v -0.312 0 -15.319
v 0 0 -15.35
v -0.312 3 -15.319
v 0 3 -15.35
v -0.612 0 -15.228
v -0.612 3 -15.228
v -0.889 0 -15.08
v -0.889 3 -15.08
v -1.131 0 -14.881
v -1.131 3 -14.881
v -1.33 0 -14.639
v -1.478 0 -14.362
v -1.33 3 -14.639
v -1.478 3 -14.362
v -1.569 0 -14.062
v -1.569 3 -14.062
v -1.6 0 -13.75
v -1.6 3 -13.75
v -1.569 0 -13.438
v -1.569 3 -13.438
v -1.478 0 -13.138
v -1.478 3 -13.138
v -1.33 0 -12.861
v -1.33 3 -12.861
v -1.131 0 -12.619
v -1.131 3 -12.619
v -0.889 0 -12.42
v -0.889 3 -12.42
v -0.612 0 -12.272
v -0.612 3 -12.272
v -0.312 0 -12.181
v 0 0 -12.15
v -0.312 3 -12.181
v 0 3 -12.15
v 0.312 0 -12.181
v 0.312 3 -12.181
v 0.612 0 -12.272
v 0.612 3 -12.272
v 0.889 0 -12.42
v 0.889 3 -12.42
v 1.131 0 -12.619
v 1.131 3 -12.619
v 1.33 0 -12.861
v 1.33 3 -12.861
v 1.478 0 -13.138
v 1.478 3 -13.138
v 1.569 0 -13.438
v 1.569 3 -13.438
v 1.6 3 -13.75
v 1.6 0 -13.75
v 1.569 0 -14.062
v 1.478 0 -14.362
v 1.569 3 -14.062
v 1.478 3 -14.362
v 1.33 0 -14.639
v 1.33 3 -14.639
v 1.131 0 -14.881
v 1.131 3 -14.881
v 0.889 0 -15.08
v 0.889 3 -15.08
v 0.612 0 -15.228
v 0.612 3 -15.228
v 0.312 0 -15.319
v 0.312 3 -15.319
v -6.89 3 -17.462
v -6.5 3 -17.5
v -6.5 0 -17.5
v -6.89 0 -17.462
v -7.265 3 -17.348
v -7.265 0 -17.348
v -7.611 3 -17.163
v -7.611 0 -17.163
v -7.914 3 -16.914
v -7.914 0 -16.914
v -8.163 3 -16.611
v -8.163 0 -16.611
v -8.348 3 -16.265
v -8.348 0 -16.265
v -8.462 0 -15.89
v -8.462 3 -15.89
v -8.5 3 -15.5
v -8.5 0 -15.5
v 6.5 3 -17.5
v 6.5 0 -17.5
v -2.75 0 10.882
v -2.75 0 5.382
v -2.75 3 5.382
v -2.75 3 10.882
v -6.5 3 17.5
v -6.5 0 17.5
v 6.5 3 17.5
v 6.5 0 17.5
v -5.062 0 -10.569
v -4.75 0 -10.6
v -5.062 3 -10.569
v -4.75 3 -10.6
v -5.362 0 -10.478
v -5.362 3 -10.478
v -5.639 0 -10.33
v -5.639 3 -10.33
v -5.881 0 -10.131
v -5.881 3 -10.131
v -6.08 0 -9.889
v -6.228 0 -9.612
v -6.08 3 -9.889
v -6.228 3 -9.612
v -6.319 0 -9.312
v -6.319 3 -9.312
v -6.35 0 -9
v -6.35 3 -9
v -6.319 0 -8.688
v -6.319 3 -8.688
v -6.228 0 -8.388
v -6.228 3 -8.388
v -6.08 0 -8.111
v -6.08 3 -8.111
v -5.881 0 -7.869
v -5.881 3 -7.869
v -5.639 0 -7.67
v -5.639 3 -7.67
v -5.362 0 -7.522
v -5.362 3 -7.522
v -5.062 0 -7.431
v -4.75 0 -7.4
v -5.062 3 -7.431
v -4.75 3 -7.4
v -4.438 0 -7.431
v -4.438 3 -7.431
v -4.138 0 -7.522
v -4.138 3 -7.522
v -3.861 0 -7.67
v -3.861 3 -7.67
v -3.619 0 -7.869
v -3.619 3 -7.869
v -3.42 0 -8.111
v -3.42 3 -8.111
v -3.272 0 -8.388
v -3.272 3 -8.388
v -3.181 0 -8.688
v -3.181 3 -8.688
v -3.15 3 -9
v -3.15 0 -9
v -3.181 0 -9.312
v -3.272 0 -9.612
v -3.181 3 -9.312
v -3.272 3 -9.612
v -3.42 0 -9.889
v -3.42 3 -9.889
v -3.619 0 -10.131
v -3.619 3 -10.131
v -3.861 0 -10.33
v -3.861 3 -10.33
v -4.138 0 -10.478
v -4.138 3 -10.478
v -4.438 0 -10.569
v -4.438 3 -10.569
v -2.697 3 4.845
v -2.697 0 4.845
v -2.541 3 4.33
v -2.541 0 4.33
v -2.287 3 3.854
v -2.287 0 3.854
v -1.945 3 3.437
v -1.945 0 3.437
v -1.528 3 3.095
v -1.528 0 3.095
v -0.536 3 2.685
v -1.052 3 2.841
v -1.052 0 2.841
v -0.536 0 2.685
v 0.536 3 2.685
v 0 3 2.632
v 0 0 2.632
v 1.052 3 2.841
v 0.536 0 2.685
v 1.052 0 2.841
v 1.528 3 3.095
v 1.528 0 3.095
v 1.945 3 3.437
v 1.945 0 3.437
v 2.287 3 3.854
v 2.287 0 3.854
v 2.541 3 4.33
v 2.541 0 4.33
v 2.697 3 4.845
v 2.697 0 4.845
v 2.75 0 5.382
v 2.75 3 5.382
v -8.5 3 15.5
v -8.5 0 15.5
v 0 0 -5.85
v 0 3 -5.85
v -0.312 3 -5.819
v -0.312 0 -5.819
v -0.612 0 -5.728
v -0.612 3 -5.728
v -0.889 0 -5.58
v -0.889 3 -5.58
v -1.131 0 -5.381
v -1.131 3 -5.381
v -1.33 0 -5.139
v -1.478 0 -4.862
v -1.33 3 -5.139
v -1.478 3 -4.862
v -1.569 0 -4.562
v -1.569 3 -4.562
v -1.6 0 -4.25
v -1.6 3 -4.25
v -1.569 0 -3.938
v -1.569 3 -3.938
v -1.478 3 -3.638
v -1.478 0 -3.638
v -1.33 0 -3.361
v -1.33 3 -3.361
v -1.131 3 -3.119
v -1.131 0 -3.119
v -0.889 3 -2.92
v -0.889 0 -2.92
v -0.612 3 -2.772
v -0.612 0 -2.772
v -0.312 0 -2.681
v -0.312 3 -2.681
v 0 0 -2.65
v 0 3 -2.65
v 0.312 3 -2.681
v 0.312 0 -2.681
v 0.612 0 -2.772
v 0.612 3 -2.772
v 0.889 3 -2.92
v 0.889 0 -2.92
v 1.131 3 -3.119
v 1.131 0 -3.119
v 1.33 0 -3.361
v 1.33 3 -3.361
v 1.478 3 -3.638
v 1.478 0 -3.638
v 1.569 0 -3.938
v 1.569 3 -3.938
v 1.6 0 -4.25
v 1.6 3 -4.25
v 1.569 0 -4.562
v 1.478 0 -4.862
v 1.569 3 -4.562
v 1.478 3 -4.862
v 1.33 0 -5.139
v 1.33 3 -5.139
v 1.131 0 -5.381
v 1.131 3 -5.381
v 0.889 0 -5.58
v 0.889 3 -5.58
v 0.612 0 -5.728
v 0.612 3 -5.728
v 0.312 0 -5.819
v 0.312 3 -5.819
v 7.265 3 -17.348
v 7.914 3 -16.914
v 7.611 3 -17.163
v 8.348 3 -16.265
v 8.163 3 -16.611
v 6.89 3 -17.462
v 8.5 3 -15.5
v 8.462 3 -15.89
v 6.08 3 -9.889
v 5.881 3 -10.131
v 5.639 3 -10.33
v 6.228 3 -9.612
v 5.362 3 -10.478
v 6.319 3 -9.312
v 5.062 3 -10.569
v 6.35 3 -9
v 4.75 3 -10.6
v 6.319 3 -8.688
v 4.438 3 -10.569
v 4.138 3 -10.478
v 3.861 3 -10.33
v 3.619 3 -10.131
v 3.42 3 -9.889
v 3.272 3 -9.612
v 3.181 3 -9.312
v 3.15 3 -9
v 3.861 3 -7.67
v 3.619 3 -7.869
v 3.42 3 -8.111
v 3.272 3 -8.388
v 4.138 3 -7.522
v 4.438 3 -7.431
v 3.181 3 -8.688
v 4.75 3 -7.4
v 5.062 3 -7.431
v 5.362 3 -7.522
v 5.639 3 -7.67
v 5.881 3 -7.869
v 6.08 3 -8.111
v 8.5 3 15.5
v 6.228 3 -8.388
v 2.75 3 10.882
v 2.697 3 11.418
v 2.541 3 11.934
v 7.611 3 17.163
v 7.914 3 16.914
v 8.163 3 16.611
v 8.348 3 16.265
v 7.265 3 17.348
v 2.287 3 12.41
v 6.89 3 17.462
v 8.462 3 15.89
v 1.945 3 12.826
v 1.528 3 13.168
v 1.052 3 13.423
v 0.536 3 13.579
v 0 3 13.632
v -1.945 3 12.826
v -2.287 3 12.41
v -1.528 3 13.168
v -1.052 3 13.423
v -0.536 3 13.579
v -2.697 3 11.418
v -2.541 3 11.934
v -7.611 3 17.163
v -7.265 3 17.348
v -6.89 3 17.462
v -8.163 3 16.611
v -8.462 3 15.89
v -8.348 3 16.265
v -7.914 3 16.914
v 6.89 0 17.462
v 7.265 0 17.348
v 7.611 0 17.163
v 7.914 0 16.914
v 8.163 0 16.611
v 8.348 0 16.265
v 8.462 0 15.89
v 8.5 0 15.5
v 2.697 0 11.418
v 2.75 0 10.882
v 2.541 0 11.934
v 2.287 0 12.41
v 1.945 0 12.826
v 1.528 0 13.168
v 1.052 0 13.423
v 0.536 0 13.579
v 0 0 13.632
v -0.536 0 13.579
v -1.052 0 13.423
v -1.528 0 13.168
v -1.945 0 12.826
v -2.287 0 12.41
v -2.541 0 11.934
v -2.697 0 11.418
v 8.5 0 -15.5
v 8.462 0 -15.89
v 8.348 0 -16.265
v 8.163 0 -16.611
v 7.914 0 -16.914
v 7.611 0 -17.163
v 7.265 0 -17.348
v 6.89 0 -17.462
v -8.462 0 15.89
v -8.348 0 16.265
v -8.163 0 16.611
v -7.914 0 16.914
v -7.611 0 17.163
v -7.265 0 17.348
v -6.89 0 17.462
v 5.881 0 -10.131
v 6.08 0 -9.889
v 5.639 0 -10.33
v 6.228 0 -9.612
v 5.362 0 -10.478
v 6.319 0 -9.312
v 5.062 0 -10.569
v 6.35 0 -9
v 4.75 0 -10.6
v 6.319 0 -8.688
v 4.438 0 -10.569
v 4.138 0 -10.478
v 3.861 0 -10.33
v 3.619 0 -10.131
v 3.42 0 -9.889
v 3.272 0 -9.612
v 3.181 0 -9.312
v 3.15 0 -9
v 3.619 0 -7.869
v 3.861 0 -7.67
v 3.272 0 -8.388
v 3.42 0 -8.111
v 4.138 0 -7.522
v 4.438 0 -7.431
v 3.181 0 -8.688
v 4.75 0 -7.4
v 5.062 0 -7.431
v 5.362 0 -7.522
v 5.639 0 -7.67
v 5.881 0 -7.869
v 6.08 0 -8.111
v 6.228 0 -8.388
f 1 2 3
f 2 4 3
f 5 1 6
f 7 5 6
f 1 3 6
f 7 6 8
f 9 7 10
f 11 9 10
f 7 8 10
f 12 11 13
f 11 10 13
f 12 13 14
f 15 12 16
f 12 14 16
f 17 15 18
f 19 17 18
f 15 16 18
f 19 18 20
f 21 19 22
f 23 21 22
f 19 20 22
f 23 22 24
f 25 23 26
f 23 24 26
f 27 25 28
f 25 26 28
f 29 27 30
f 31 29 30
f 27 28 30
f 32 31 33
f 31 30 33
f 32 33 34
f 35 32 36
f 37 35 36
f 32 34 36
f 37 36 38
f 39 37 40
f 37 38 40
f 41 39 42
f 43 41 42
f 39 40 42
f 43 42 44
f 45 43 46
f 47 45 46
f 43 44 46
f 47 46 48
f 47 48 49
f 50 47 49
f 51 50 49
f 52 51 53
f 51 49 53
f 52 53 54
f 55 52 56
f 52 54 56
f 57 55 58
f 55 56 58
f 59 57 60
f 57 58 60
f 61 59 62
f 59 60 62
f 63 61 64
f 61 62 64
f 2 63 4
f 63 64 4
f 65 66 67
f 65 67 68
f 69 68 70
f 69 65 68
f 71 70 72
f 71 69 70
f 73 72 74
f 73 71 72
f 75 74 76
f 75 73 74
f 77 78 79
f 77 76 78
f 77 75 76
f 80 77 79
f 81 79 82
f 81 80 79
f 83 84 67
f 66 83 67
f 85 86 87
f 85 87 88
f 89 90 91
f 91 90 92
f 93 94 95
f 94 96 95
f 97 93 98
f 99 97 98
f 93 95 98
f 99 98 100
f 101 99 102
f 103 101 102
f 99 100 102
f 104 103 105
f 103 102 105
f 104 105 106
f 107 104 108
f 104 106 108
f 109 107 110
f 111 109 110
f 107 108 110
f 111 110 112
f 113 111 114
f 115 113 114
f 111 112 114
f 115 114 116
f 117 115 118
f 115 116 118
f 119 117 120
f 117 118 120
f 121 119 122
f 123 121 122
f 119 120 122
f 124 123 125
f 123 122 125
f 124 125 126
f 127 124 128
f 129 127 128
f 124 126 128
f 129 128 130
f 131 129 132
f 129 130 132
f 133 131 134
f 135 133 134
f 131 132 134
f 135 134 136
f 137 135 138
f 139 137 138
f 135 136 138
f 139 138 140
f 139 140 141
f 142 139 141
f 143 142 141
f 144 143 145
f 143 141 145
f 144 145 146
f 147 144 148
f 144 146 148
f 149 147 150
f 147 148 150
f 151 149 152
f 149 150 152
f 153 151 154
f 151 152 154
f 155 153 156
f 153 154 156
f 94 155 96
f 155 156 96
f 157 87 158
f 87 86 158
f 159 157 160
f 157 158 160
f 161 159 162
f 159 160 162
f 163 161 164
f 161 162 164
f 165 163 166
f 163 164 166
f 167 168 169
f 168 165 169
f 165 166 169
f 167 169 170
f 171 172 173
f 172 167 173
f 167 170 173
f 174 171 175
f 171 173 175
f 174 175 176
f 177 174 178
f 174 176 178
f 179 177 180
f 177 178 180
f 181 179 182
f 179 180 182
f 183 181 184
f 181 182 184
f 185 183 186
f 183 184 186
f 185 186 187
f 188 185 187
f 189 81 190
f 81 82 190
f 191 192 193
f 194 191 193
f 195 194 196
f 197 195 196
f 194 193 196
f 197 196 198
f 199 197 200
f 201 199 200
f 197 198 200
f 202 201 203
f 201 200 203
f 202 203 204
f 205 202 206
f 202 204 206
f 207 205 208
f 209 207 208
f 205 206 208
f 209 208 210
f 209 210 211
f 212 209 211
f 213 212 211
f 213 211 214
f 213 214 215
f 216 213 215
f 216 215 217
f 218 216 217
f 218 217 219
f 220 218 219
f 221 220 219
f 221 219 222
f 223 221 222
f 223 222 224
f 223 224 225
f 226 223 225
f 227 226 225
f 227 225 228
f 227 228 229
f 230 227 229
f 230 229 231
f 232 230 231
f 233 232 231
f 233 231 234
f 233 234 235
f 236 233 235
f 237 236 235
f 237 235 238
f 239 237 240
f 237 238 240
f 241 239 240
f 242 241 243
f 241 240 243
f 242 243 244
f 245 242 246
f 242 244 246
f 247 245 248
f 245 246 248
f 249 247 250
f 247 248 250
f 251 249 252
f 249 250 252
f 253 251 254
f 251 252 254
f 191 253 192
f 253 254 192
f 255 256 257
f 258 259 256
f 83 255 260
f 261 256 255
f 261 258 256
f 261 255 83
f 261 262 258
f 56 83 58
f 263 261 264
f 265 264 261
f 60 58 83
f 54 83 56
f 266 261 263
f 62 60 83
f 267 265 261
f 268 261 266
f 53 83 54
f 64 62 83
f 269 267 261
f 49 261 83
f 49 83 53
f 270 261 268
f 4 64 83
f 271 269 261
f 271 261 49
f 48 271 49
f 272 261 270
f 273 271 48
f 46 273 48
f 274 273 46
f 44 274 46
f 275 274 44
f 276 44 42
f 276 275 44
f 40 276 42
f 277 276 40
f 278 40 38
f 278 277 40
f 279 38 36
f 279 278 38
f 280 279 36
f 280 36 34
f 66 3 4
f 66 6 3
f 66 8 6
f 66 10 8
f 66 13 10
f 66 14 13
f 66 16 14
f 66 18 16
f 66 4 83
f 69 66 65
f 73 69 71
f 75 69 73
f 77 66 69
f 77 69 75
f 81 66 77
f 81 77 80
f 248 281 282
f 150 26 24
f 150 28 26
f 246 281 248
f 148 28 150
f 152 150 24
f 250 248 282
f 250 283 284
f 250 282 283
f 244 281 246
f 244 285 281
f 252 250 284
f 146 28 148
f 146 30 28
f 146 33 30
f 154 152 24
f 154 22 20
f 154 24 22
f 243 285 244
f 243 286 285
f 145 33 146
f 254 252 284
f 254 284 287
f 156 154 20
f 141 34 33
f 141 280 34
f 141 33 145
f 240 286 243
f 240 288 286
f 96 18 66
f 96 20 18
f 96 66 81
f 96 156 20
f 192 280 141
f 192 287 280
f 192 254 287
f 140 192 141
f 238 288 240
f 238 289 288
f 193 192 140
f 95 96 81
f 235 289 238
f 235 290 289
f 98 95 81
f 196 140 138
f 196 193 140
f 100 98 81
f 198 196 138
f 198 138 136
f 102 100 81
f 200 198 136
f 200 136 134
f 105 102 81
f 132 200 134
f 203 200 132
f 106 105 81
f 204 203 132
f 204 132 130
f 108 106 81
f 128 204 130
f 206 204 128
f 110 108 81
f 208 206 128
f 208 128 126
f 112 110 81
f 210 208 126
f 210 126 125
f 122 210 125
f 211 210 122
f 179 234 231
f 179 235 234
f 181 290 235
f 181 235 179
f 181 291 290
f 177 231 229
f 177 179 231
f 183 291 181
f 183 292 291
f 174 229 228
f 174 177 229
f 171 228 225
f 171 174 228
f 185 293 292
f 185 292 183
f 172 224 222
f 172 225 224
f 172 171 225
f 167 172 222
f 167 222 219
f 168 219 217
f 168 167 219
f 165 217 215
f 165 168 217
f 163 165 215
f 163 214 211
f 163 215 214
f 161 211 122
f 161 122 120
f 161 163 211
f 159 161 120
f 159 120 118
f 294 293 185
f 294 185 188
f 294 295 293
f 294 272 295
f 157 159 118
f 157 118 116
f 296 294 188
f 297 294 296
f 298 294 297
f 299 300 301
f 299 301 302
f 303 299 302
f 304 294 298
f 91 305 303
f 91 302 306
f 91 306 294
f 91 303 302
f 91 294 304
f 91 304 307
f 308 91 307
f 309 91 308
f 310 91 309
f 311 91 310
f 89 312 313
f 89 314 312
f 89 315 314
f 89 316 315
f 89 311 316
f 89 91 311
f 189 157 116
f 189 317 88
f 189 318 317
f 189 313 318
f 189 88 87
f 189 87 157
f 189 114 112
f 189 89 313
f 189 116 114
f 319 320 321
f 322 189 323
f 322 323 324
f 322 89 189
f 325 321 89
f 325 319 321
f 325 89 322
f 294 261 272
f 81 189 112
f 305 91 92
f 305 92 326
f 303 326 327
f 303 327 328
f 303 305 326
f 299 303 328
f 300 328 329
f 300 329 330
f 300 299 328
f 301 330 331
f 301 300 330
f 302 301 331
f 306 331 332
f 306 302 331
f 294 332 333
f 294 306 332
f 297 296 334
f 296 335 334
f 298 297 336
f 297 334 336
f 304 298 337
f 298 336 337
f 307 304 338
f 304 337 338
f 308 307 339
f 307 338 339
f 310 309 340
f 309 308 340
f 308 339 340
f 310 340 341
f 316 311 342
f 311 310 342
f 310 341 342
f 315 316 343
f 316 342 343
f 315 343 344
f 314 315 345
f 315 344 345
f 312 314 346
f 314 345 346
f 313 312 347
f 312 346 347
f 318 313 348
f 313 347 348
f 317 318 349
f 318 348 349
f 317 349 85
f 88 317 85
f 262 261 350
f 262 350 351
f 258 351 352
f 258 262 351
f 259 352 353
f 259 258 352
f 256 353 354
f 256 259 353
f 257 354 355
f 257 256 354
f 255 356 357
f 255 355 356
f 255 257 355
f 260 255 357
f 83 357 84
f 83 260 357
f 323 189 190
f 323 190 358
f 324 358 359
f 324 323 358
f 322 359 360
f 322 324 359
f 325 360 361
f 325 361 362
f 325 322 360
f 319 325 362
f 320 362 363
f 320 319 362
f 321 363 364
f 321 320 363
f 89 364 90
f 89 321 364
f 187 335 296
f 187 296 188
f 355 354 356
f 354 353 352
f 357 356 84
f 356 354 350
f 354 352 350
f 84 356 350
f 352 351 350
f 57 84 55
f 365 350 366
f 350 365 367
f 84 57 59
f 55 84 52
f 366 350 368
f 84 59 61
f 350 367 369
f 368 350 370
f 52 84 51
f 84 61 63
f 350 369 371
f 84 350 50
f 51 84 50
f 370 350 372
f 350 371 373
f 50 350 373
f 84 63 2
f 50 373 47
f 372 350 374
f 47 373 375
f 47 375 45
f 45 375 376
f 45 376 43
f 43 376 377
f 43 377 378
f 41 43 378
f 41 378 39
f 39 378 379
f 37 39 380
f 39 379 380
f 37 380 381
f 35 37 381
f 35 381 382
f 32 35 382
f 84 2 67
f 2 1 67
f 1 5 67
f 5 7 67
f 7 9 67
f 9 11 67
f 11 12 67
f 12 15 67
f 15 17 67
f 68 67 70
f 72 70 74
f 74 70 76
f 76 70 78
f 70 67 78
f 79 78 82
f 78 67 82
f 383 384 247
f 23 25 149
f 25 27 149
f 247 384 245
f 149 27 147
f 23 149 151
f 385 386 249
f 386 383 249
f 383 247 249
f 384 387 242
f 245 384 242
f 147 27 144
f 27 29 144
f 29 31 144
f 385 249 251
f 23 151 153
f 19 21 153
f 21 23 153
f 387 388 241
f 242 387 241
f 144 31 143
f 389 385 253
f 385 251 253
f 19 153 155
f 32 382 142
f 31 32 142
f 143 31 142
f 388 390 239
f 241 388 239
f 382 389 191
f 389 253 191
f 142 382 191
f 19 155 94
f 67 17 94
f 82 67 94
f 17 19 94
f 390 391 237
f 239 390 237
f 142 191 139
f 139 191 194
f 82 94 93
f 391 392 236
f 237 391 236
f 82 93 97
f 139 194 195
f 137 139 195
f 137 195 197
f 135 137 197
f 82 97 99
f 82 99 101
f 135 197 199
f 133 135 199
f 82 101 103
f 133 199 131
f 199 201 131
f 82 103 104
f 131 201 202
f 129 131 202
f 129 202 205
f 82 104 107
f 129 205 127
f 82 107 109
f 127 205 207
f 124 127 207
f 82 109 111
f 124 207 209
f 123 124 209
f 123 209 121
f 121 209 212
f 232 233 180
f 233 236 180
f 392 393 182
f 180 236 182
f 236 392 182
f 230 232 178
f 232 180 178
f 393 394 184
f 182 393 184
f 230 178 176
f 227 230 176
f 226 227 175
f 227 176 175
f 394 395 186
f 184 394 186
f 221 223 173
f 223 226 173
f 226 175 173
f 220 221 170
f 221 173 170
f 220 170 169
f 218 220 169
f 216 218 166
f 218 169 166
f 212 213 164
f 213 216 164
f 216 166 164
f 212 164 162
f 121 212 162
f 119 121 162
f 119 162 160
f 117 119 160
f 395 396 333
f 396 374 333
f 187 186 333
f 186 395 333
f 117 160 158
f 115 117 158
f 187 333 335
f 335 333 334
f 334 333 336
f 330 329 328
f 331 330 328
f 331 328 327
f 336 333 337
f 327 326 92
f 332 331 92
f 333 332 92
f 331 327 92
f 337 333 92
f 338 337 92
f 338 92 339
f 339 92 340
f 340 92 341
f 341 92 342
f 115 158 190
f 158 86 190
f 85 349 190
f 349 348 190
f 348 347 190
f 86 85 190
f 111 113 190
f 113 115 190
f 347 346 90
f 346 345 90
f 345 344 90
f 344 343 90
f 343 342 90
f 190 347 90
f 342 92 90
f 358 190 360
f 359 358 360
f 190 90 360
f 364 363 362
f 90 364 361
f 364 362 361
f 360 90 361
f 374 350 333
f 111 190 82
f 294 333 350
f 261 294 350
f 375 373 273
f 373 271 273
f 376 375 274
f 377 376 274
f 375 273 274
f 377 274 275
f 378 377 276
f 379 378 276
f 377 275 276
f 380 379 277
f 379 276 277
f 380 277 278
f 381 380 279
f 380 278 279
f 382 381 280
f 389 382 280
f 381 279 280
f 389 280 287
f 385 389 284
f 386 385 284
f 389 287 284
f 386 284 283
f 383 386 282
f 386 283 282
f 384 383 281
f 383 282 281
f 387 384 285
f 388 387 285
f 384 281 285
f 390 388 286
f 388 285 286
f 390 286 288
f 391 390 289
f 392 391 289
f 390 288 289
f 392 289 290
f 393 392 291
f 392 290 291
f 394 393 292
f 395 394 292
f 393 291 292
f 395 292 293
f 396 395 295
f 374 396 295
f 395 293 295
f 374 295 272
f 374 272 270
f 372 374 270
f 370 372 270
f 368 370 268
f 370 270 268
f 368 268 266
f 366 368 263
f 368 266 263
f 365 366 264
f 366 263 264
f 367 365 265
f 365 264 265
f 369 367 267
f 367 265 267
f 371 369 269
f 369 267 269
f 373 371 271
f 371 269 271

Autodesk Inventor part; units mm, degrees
ref_plane "YZ Plane" through (0, 0, 0) normal (1, 0, 0) x (0, 1, 0)
ref_plane "XZ Plane" through (0, 0, 0) normal (0, 1, 0) x (-1, 0, 0)
sketch "Sketch1" plane through (0, 0, 0) normal (0, 1, 0) x (-1, 0, 0)
  line L0 (8.5, 17.5) -> (-8.5, 17.5)
  line L1 (-8.5, 17.5) -> (-8.5, -17.5)
  line L2 (-8.5, -17.5) -> (8.5, -17.5)
  line L3 (8.5, -17.5) -> (8.5, 17.5)
  line L4 (8.5, 17.5) -> (-8.5, -17.5) construction
  line L5 (-8.5, 17.5) -> (8.5, -17.5) construction
  line L6 (0, -17.5) -> (0, -0.5)
  line L7 (0, -9) -> (4.75, -9) construction
  circle A0 centre (0, -9) radius 4.75 construction
  line L8 (0, 10.8819) -> (0, 5.3819) construction
  line L9 (-2.75, 10.8819) -> (-2.75, 5.3819)
  line L10 (2.75, 5.3819) -> (2.75, 10.8819)
  arc A1 (2.75, 10.8819) -> (-2.75, 10.8819) centre (0, 10.8819) ccw
  arc A2 (-2.75, 5.3819) -> (2.75, 5.3819) centre (0, 5.3819) ccw
  point P0 (0, 0)
  point P1 (0, -4.25)
  point P2 (0, -13.75)
  point P3 (-4.75, -9)
  point P4 (0, 8.1319)
  dimension "d0" = 17
  dimension "d1" = 35
  dimension "d2" = 17
  dimension "d3" = 4.75
  dimension "d4" = 2.75
  dimension "d5" = 5.5
extrude "Plate1" add sketch "Sketch1" along normal blind 3
hole "Hole1" at (0, 0, -4.25) at (0, 0, -13.75) at (-4.75, 0, -9) at (4.75, 0, -9) direction (0, 1, 0) diameter 3.2 depth 3 tip angle 118
fillet "Fillet1" radius 2 4 edges at (-8.5, 1.5, 17.5) (8.5, 1.5, 17.5) (-8.5, 1.5, -17.5) (8.5, 1.5, -17.5)
ref_plane "Work Plane1" through (0, 0, 5.3819) normal (-1, 0, 0) x (0, 0, 1)
equation "\"d12\" = Thickness"
equation "\"d6\" = Thickness"
equation "\"BendRadius\" = Thickness"
equation "\"BendReliefWidth\" = Thickness"
equation "\"BendReliefDepth\" = 0.5 * Thickness"
equation "\"CornerReliefSize\" = 4 * Thickness"
equation "\"MinimumRemnant\" = 2 * Thickness"
equation "\"TransitionRadius\" = BendRadius"
equation "\"JacobiRadiusSize\" = BendRadius"
equation "\"GapSize\" = Thickness"
equation "\"Thickness\" = 3"
properties part number "LimitSwitchMount" material "Aluminum 6061"
